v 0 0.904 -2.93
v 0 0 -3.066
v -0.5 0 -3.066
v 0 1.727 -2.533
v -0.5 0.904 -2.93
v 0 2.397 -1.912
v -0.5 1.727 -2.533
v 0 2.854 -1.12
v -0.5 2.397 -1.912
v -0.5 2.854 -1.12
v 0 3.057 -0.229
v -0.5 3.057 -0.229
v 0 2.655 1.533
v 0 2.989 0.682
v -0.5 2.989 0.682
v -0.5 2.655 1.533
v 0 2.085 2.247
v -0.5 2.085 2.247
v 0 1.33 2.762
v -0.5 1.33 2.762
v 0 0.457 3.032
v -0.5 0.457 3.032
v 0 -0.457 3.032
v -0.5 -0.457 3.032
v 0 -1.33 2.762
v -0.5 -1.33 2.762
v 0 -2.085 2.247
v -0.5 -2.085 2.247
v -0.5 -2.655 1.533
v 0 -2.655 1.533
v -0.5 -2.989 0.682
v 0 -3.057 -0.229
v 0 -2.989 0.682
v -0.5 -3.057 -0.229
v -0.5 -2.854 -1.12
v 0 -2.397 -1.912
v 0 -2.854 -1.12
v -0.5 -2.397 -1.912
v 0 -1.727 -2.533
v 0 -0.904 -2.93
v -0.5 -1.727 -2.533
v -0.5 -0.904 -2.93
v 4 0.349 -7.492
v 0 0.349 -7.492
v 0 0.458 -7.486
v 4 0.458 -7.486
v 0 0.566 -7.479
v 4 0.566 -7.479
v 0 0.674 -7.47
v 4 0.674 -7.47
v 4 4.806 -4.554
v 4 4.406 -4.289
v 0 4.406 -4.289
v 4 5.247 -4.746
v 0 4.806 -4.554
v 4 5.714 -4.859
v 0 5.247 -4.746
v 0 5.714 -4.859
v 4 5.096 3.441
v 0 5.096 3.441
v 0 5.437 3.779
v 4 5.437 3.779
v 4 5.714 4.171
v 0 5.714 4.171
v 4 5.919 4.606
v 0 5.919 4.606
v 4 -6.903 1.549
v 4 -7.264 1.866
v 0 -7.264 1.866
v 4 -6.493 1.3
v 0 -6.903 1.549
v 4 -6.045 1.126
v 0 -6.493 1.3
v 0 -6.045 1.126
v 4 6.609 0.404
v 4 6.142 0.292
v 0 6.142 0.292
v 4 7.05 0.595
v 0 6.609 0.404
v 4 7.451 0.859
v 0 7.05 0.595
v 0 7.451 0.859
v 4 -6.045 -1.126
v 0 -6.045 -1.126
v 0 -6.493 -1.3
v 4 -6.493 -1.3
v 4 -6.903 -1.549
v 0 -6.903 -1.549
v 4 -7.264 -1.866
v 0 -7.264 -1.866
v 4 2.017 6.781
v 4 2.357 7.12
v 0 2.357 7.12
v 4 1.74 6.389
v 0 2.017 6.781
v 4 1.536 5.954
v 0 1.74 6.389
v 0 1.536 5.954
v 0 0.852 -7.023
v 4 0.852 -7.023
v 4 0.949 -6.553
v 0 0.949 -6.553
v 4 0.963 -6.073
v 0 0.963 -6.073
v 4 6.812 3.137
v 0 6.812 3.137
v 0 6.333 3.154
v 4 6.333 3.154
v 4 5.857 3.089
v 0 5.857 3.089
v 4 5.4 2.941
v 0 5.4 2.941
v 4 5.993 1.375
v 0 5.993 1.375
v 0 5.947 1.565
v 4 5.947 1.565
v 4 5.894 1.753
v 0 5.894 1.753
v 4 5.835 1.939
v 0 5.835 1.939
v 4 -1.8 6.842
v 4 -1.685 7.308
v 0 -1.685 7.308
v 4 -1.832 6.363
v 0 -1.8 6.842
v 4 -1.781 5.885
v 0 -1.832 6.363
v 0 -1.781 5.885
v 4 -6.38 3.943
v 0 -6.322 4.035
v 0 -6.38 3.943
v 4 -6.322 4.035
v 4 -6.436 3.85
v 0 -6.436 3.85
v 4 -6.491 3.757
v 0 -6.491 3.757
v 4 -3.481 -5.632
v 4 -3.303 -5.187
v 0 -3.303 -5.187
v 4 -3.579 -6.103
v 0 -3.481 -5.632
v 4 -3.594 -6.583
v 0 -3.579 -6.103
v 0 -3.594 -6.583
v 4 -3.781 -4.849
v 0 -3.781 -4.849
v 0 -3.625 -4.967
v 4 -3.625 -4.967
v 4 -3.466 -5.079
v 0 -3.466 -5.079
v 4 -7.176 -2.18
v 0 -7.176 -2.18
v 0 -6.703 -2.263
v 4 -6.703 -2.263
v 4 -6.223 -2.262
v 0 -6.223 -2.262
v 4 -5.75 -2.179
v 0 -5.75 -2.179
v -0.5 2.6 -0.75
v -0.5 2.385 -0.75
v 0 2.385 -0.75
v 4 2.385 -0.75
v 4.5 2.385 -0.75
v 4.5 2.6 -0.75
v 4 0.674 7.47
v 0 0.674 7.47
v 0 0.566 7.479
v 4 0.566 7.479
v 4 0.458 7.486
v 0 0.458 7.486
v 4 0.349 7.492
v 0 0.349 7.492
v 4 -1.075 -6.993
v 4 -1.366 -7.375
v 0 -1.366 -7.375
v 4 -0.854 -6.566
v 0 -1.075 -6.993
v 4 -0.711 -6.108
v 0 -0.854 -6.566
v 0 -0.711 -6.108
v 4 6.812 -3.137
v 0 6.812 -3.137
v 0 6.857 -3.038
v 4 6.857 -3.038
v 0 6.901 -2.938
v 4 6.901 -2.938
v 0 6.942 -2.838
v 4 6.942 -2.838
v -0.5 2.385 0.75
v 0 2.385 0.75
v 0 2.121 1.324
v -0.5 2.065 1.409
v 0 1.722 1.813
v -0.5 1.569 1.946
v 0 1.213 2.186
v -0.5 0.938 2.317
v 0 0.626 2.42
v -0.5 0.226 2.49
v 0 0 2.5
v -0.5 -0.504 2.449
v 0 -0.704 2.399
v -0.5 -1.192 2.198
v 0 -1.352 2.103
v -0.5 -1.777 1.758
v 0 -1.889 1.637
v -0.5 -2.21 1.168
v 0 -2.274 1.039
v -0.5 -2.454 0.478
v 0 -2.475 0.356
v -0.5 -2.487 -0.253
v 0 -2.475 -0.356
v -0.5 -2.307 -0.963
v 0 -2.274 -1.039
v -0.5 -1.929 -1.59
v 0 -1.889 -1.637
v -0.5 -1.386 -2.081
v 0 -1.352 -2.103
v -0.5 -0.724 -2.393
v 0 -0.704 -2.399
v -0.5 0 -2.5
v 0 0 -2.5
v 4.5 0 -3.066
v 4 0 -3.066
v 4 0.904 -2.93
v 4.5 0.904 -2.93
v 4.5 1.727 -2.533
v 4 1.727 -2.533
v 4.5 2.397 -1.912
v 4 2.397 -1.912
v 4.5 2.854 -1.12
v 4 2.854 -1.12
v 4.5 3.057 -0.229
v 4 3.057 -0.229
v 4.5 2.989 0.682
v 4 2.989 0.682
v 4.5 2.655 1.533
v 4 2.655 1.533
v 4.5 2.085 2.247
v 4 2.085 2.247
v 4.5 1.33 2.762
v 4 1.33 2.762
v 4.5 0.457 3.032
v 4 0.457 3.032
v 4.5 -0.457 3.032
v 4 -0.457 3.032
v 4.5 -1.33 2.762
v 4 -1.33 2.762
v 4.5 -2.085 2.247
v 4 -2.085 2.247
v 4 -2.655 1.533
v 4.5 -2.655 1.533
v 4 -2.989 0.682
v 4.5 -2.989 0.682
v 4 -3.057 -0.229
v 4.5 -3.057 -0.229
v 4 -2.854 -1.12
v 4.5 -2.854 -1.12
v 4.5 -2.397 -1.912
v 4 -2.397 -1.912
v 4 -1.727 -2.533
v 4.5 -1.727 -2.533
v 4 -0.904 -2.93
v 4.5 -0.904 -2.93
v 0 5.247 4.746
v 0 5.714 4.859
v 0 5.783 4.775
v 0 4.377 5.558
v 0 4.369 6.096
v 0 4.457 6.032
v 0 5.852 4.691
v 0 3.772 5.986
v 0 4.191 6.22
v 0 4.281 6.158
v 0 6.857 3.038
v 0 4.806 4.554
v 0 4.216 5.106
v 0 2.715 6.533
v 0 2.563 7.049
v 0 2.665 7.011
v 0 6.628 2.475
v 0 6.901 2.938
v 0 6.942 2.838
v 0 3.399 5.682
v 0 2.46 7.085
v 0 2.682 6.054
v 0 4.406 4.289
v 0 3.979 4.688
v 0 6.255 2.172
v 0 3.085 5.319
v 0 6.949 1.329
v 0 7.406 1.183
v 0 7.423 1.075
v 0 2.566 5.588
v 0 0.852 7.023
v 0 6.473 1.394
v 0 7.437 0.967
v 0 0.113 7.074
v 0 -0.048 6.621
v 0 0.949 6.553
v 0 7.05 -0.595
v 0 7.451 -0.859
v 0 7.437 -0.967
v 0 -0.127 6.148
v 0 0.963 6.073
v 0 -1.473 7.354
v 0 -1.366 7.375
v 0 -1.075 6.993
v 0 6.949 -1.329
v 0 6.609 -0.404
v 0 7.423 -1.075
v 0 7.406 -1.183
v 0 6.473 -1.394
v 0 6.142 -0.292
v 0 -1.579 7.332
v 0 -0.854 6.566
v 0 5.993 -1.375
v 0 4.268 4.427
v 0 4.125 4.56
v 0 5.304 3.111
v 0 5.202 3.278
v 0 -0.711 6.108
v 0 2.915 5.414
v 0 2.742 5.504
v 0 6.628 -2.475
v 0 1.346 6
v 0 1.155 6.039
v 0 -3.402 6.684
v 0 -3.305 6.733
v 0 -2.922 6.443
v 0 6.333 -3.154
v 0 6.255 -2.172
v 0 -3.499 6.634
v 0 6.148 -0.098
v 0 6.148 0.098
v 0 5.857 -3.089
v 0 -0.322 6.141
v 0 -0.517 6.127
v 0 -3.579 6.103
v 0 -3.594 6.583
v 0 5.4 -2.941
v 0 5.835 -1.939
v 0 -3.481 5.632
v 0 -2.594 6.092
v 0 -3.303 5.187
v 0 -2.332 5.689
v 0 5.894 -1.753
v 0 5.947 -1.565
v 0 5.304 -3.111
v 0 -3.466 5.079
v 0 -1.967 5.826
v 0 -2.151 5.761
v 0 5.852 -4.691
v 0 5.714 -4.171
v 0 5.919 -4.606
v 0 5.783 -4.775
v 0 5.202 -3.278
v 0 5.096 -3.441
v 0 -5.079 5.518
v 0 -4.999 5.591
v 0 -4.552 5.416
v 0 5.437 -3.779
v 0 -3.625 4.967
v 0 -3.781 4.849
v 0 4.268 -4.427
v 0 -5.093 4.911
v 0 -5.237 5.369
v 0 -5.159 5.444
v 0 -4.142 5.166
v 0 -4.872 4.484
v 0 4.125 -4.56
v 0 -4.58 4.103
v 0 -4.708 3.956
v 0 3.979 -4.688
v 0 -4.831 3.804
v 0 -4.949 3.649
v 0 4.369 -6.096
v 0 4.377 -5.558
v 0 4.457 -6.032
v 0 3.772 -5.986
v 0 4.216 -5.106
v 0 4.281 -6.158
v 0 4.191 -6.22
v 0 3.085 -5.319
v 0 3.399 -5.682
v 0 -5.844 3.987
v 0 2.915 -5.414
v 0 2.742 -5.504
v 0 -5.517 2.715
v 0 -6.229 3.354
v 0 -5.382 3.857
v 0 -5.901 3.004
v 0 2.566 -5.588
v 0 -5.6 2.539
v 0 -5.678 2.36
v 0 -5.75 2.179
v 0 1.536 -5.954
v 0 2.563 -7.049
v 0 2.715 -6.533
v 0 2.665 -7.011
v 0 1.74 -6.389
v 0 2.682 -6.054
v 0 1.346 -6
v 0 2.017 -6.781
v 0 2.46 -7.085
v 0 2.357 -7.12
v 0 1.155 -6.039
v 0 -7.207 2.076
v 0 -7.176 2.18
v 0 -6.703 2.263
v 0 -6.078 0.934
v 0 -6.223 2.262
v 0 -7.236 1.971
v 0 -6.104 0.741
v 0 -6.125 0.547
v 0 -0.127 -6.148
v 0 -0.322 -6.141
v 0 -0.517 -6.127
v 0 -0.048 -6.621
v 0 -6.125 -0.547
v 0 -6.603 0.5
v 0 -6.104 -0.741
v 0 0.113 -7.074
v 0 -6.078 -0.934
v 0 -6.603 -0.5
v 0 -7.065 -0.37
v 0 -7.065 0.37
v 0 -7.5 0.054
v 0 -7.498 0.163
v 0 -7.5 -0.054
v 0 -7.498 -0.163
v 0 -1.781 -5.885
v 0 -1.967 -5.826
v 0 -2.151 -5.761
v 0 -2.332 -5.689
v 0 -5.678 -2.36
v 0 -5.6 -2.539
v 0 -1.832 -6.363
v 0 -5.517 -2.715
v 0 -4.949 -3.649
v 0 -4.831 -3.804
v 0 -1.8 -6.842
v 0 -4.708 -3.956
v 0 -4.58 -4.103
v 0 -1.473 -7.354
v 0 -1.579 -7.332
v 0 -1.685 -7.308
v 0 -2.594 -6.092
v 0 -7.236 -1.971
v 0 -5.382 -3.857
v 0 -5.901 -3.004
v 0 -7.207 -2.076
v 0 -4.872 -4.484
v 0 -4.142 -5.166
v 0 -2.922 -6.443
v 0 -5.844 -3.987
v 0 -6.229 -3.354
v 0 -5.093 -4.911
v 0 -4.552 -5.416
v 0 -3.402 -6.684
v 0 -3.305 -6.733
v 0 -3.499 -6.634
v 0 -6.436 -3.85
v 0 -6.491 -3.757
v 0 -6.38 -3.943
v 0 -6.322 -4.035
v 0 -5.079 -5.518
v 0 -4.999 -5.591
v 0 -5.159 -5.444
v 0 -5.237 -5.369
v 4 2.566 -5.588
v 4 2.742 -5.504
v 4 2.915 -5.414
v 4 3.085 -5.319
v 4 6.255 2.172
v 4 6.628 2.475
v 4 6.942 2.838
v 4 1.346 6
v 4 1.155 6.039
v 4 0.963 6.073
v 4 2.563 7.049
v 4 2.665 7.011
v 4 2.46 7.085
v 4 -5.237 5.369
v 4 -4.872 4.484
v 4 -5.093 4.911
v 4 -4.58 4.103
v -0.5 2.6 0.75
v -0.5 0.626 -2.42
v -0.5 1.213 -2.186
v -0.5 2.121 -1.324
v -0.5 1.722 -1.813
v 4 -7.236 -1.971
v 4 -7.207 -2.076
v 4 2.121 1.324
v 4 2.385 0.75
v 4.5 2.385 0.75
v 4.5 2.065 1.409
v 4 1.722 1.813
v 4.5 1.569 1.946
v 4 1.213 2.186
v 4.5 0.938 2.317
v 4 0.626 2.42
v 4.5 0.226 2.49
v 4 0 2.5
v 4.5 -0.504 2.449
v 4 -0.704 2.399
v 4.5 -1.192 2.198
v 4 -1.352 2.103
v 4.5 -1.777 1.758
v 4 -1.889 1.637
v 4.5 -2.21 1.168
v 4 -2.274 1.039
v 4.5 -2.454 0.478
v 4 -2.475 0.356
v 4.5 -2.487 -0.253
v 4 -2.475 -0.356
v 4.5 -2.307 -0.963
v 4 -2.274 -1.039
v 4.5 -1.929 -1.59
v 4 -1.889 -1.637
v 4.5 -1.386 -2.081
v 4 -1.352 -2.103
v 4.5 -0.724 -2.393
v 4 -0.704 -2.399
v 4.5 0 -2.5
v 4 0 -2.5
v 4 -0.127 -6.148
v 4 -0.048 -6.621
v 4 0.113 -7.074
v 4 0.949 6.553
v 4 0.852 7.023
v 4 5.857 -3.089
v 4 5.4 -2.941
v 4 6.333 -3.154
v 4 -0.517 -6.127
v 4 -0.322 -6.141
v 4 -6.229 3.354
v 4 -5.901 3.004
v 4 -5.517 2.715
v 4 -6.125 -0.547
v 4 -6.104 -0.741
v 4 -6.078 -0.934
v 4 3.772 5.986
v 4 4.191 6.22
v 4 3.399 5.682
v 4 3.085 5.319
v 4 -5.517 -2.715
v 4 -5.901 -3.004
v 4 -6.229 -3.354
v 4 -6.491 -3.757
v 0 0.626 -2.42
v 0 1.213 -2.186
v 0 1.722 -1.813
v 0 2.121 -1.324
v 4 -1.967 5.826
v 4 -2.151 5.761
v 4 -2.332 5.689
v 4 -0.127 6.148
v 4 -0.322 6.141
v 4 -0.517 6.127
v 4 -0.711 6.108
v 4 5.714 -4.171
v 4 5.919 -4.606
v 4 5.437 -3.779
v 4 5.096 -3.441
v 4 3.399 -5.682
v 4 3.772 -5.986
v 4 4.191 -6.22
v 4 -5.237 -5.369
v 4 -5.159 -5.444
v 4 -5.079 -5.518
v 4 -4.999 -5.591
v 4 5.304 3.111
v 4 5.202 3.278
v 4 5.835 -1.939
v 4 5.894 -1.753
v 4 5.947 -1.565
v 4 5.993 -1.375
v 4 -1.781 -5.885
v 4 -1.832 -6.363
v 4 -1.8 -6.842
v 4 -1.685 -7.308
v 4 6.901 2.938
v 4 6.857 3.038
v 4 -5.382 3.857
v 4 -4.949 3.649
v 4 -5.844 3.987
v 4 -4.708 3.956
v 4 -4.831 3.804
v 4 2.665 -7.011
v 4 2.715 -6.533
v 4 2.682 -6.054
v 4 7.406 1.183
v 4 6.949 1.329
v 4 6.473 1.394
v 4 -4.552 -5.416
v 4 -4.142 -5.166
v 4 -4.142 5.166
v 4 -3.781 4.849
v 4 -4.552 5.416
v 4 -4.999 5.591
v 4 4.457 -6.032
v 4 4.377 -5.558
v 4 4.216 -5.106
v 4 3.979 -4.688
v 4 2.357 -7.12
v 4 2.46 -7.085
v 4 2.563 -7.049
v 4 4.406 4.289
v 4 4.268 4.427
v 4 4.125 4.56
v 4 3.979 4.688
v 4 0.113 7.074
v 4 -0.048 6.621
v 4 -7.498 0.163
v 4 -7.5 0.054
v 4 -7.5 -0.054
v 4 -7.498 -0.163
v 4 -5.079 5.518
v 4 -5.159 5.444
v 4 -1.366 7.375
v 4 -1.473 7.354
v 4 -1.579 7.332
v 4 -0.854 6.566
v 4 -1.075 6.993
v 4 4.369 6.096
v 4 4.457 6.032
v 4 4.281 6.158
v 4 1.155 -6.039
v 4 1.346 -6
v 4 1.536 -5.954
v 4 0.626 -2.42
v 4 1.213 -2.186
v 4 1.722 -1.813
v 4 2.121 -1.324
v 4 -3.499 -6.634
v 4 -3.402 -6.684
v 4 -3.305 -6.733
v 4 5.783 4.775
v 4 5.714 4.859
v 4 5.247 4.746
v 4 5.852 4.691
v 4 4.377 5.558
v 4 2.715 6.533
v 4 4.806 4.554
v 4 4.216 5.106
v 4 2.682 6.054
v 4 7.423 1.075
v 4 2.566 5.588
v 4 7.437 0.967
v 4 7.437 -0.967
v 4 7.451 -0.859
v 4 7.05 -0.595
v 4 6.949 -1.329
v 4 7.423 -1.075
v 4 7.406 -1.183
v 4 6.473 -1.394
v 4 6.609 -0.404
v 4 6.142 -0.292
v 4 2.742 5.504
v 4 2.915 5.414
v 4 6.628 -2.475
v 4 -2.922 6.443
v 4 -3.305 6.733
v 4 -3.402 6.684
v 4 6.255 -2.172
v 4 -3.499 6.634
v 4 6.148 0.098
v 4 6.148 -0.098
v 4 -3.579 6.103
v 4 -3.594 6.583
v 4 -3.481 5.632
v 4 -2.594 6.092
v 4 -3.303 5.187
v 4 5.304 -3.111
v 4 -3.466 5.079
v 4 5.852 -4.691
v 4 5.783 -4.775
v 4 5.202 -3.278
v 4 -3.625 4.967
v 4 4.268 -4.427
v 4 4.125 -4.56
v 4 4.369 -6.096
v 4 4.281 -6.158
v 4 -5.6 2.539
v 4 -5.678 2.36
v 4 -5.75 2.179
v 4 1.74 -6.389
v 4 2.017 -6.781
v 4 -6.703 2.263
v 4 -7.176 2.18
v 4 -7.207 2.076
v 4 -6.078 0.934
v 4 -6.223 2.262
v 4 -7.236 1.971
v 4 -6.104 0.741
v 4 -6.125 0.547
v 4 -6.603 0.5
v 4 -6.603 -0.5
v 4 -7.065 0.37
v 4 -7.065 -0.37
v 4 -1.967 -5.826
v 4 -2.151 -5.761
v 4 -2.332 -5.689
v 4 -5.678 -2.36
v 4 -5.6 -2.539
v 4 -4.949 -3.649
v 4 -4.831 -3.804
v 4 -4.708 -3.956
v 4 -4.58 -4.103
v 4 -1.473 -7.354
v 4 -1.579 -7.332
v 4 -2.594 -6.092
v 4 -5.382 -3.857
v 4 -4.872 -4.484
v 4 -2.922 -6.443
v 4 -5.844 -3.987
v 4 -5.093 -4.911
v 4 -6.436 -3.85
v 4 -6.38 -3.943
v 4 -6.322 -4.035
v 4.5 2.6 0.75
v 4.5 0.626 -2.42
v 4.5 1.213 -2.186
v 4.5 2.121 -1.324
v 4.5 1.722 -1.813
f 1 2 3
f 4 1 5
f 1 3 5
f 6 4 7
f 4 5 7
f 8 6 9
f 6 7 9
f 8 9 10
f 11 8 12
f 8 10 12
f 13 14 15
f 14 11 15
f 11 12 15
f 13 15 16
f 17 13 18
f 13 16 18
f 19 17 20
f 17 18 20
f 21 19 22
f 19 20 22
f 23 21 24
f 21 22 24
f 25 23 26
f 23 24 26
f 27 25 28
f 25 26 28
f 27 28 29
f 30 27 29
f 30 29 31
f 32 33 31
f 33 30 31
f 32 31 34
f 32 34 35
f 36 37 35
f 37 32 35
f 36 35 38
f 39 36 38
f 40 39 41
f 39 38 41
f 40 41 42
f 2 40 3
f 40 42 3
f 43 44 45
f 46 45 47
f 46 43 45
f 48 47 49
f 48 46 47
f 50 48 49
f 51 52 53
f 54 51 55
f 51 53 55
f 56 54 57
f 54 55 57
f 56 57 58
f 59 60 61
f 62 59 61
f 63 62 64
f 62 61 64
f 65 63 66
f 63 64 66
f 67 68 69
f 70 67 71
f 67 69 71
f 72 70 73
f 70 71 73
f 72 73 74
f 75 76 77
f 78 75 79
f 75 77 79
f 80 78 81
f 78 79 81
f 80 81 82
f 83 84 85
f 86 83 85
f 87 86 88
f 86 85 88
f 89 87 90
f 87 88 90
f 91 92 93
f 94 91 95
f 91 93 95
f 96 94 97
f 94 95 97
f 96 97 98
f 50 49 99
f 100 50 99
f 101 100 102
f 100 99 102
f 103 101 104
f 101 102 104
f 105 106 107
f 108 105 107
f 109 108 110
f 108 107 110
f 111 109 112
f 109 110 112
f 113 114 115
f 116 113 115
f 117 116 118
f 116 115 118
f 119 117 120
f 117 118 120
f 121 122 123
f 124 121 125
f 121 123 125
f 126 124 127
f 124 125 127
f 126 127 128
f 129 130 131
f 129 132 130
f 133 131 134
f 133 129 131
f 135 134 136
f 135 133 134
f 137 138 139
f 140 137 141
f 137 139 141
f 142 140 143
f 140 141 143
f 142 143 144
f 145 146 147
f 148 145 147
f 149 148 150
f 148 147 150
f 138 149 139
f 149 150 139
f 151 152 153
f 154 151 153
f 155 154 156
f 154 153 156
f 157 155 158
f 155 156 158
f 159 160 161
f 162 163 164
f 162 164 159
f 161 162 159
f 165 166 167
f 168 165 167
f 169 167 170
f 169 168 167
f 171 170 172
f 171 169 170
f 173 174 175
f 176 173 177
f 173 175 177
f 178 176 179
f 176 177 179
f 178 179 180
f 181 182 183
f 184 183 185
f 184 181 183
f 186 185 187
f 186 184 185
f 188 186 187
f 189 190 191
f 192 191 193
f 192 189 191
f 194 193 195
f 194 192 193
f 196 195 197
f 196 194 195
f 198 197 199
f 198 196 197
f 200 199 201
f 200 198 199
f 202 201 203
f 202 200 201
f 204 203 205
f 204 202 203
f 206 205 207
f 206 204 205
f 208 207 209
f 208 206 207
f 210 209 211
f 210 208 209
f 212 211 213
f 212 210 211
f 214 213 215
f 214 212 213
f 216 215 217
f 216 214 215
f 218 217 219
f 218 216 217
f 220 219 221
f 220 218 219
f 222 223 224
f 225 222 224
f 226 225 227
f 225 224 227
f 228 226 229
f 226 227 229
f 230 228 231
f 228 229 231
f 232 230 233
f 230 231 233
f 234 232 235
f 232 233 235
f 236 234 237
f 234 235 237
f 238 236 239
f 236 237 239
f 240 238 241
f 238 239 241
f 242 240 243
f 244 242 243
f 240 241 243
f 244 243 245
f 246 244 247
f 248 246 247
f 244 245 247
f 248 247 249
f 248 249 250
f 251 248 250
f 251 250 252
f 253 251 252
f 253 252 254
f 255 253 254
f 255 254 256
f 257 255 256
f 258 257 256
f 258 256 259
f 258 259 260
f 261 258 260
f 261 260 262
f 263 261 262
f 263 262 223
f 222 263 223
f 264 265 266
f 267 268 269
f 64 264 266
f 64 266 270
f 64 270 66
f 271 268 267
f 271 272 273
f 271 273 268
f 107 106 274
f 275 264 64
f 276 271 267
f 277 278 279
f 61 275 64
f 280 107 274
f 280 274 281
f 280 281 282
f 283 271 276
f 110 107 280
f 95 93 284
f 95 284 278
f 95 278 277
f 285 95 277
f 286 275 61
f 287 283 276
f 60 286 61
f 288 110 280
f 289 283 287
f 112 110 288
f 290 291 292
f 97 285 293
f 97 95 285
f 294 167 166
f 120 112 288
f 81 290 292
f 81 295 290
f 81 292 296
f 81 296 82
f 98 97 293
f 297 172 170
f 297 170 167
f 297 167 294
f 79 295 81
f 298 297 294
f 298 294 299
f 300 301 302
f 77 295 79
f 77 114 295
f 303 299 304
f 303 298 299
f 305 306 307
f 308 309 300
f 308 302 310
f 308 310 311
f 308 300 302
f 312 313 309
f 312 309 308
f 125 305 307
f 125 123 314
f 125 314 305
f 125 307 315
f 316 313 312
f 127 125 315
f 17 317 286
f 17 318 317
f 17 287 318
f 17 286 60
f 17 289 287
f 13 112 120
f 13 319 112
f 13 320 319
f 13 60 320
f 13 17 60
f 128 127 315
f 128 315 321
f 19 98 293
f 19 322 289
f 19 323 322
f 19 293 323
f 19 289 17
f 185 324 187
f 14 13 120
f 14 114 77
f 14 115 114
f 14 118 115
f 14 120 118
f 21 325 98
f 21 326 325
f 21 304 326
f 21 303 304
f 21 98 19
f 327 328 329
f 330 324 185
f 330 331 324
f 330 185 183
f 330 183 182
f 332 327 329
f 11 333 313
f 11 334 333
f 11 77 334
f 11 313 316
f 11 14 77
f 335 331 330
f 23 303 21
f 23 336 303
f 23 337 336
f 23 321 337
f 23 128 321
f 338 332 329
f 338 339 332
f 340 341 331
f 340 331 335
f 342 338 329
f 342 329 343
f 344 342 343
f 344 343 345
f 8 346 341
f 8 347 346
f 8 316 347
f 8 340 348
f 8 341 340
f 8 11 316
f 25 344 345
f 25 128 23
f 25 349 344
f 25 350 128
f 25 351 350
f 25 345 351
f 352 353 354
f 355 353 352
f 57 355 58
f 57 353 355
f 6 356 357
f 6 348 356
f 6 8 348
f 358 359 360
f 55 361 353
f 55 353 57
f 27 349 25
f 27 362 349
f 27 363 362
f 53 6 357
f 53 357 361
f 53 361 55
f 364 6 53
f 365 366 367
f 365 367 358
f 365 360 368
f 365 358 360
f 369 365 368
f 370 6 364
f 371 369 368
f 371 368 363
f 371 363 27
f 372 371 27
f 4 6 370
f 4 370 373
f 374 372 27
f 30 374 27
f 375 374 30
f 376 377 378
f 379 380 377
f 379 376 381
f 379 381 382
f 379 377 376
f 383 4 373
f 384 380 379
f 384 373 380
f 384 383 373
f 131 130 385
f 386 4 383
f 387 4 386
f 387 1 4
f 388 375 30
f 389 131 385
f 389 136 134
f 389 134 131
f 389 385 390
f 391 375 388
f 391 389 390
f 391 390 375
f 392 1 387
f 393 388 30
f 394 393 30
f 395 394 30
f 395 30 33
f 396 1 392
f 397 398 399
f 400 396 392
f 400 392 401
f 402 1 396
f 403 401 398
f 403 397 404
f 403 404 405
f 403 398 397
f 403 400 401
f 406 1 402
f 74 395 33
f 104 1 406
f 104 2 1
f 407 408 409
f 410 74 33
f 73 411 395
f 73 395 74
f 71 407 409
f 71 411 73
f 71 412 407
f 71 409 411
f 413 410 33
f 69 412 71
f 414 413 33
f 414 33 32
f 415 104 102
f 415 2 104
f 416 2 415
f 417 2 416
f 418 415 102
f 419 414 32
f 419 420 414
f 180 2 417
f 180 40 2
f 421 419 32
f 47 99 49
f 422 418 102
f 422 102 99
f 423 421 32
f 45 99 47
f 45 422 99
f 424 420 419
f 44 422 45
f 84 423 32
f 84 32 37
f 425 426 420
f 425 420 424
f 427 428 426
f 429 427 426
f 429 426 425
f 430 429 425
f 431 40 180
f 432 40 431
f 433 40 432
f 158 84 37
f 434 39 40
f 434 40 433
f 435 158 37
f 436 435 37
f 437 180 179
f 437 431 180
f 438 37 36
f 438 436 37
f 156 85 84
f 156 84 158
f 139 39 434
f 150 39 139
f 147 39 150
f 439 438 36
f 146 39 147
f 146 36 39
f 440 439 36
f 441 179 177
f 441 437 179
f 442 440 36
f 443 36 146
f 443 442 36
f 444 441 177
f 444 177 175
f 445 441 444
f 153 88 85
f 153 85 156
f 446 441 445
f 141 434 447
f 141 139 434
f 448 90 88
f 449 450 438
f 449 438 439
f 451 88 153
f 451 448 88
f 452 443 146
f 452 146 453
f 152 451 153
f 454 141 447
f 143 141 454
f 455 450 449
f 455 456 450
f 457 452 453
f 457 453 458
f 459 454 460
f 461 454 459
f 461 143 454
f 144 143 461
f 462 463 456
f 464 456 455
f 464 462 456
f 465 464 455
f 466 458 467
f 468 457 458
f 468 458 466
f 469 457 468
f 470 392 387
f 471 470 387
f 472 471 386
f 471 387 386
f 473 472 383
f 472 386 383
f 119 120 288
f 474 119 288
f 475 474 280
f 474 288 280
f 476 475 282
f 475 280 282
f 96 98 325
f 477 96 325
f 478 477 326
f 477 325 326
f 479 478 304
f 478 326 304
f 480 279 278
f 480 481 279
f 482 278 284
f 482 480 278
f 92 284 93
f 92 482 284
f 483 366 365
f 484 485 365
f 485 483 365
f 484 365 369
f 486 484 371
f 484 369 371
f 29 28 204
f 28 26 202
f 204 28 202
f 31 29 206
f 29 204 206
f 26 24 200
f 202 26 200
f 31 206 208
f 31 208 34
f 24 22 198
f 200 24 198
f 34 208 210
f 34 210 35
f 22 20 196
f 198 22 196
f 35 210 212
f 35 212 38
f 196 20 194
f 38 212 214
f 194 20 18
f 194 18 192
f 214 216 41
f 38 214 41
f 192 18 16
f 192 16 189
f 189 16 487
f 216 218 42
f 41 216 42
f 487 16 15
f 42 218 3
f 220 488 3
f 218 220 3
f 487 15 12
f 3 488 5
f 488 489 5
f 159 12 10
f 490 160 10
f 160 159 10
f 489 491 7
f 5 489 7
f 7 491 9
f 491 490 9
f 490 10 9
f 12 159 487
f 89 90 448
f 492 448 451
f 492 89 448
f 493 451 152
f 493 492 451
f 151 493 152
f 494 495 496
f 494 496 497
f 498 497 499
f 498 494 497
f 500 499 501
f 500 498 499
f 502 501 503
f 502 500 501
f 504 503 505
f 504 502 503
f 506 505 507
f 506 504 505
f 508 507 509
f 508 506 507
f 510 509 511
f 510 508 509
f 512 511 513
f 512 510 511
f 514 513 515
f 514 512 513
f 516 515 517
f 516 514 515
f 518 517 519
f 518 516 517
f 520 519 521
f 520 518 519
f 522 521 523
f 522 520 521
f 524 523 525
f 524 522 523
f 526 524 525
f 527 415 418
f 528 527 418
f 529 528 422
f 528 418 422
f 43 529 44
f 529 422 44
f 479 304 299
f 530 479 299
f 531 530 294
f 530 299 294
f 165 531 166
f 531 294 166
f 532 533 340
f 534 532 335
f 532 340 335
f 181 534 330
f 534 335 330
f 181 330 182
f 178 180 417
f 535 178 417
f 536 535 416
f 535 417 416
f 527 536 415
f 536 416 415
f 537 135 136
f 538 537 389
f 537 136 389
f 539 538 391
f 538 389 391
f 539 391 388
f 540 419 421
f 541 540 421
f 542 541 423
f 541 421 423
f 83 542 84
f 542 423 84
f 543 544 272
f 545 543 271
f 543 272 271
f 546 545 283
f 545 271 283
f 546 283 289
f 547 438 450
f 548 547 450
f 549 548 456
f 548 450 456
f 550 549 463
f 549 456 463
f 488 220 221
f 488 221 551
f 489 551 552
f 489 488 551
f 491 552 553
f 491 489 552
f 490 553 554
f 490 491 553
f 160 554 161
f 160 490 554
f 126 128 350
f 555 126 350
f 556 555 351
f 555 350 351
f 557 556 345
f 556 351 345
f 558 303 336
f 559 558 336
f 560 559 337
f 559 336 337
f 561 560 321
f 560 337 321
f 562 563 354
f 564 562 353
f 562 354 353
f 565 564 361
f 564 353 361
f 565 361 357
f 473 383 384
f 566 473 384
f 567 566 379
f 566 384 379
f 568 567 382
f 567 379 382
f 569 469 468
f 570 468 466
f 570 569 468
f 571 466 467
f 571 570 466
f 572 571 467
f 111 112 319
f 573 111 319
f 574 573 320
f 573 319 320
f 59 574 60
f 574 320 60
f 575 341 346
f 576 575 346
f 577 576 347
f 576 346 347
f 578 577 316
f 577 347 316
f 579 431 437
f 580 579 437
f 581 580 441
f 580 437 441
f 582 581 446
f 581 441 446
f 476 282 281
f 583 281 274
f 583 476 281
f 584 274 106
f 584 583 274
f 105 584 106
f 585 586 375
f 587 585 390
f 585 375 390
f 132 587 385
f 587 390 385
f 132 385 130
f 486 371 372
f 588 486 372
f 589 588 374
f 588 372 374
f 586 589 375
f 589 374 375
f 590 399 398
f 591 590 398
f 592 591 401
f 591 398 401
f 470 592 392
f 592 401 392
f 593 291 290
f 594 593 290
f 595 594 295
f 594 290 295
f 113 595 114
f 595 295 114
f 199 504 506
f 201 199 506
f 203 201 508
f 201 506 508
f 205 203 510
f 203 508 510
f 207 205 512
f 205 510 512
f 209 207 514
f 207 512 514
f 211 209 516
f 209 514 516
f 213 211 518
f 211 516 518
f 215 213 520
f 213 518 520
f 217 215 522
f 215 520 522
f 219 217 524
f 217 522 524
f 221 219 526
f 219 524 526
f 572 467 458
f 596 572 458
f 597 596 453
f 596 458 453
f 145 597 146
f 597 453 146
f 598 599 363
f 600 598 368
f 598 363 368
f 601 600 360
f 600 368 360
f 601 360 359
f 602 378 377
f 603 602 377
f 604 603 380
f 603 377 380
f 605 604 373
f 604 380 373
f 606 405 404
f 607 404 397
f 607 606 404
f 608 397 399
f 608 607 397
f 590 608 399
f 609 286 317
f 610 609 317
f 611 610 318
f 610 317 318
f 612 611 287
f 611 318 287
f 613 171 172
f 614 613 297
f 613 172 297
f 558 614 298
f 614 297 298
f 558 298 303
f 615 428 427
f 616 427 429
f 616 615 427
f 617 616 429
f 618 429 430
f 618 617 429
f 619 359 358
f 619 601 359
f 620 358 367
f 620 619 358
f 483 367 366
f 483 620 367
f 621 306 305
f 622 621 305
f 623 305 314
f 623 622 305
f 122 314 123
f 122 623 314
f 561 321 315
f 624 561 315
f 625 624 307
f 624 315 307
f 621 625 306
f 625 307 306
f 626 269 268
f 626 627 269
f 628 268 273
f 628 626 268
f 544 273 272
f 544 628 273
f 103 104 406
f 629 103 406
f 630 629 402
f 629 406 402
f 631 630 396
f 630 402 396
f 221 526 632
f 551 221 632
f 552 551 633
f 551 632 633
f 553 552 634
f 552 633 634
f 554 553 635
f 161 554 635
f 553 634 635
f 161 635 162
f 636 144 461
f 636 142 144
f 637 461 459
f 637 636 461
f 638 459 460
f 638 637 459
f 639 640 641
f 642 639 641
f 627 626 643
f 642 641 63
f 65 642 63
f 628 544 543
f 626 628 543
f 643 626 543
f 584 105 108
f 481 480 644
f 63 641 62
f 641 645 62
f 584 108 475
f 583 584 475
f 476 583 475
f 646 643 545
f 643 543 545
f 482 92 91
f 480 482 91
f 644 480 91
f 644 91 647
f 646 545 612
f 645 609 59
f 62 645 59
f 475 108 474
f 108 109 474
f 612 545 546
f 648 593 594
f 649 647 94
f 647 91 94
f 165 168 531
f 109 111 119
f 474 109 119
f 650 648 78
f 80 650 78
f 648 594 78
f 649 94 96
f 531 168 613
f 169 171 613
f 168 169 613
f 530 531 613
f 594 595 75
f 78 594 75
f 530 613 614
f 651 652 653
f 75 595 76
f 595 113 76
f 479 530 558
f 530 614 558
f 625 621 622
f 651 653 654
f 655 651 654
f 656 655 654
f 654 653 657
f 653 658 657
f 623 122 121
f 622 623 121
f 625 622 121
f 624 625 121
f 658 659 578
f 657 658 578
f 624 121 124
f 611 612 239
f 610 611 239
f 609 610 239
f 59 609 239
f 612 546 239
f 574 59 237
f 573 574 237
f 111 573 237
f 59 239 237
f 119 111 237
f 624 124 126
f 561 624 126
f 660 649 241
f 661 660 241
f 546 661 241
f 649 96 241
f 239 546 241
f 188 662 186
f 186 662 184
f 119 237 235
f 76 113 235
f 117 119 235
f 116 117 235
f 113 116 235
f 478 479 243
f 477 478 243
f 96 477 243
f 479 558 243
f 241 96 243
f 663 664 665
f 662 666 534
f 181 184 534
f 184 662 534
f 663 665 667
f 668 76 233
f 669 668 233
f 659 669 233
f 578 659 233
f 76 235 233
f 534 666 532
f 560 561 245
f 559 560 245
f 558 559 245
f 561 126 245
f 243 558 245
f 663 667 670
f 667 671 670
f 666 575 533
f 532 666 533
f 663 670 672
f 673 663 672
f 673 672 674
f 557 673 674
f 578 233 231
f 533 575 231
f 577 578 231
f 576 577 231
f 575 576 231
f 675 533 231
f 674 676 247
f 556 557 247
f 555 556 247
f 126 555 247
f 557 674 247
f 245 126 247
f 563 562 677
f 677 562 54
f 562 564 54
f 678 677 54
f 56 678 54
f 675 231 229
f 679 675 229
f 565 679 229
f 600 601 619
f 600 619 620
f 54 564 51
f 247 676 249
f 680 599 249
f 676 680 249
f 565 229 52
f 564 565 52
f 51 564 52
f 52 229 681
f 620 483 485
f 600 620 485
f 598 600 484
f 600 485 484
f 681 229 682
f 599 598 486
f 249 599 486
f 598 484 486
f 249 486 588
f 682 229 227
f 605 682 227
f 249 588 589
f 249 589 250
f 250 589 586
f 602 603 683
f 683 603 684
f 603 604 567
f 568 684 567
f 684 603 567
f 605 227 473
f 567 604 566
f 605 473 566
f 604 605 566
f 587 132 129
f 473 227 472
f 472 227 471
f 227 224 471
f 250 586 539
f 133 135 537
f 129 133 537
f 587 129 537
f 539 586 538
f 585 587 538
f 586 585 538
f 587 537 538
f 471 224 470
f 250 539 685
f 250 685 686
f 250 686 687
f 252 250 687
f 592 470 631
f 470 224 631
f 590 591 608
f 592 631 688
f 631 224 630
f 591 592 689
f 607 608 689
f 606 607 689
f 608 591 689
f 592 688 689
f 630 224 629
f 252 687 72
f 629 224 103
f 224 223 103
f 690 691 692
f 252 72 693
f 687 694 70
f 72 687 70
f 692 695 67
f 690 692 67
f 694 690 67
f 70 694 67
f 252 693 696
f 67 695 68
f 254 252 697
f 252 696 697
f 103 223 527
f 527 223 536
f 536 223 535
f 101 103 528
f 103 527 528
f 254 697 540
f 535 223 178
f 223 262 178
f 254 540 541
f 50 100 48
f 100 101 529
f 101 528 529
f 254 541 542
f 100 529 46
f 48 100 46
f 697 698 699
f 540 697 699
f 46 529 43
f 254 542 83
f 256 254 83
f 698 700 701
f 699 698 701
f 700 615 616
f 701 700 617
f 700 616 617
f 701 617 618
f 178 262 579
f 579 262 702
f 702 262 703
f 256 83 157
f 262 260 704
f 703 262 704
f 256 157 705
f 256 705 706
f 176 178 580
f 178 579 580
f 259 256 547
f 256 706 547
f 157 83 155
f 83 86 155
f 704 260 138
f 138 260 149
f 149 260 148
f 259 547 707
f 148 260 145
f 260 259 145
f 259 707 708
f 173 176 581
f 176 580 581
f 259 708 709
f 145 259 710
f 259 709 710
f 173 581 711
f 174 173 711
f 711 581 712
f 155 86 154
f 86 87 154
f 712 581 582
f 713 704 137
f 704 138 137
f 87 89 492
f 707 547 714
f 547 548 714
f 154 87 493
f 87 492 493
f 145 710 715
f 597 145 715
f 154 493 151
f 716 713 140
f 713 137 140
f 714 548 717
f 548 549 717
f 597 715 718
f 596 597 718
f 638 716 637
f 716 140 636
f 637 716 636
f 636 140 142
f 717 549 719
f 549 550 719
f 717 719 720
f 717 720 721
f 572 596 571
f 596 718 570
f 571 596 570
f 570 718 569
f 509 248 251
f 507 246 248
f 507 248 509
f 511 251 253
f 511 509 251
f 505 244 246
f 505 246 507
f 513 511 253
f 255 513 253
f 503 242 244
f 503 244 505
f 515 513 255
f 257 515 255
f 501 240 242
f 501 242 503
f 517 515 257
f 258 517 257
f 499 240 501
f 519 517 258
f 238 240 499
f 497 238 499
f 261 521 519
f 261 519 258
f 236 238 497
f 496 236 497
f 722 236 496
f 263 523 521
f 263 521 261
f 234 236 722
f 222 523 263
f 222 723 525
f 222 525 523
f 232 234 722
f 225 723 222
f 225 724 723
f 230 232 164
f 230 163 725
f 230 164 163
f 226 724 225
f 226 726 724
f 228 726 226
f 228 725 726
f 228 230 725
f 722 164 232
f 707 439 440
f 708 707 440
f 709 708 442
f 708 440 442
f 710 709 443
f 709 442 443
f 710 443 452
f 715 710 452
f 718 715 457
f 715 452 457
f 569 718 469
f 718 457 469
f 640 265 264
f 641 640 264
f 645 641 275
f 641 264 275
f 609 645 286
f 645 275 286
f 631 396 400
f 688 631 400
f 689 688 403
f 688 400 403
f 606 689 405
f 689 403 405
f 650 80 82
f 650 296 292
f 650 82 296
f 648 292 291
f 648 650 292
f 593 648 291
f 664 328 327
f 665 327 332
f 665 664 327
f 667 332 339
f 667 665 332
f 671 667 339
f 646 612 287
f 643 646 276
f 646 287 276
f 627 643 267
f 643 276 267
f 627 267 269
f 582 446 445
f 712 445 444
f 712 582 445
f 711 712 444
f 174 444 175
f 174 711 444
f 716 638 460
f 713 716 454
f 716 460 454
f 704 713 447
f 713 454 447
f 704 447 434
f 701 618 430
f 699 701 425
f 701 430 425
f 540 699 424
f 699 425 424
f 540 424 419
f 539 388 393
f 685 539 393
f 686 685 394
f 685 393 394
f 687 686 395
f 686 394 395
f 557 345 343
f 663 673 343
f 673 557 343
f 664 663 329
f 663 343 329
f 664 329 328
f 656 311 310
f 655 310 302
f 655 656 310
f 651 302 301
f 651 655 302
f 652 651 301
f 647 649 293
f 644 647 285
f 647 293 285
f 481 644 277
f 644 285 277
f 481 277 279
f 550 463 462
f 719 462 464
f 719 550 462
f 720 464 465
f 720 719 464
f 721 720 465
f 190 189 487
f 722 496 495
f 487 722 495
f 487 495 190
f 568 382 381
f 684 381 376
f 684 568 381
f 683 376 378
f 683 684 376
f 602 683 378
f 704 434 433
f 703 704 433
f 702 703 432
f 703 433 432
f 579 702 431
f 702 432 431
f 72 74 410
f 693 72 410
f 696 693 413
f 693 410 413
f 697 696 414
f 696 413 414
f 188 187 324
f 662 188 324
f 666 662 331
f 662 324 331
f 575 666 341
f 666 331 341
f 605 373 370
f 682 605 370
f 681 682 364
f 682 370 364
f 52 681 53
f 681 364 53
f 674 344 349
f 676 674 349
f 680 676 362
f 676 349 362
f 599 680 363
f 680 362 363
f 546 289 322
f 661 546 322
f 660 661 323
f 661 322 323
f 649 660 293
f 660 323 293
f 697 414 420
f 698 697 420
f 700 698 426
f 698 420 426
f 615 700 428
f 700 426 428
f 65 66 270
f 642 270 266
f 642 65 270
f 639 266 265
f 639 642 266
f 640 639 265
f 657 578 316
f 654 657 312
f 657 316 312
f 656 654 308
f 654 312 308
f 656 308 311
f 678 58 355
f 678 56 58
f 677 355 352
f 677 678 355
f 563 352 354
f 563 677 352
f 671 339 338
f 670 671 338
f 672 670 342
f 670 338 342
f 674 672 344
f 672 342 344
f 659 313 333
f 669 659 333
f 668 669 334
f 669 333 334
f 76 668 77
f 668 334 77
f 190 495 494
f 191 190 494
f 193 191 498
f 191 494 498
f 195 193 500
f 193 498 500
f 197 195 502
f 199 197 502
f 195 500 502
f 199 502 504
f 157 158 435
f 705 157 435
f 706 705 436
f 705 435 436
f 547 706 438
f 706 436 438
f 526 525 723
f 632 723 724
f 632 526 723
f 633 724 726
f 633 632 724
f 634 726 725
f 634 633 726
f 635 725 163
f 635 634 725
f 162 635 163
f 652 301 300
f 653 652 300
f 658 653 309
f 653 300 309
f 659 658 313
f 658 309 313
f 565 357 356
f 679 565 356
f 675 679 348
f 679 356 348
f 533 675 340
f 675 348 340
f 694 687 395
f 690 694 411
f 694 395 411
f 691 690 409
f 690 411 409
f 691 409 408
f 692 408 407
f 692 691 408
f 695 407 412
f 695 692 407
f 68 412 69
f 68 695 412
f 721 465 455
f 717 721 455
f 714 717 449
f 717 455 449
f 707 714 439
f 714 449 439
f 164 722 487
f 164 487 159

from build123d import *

# Parameters (mm, degrees)
BASPROSKE_W         = 4
BASPROSKE_H         = 7.5
TOOTHCUT_DEPTH      = 12.335784049
TEETHCUTS_COUNT     = 23
TEETHCUTS_ANGLE     = 344.347826087
BORSKE_R            = 2.5
BORE_DEPTH          = 50.0000508
EXTRUDE1_DEPTH      = 0.5
EXTRUDE1_DEPTH_BACK = 4.5
SKETCH1_R           = 3.065937152
SKETCH1_R_2         = 2.5
SKETCH2_W           = 1.5
SKETCH2_H           = 2.6
CUT_EXTRUDE1_DEPTH  = 5.5


with BuildPart() as part:
    # BasProSke → Base-Revolve (revolve)
    with BuildSketch(Plane(origin=(0, 0, 0), x_dir=(1, 0, 0), z_dir=(0, 1, 0))):
        with Locations((2, 3.75)):
            Rectangle(BASPROSKE_W, BASPROSKE_H)
    revolve(axis=Axis((-10, 0, 0), (1, 0, 0)))

    # TooCutSke → ToothCut (cut, through all)
    with BuildSketch(Plane(origin=(0, 0, 0), x_dir=(0, 0, -1), z_dir=(1, 0, 0))):
        with BuildLine():
            ThreePointArc((0.292498096, 6.142039227), (0, 6.149), (-0.292498096, 6.142039227))
            ThreePointArc((-0.292498096, 6.142039227), (-0.495998432, 6.847302274), (-0.878204189, 7.473981707))
            ThreePointArc((-0.878204189, 7.473981707), (0, 7.5254), (0.878204189, 7.473981707))
            ThreePointArc((0.878204189, 7.473981707), (0.495998432, 6.847302274), (0.292498096, 6.142039227))
        make_face()
    toothcut = extrude(amount=TOOTHCUT_DEPTH, mode=Mode.SUBTRACT)

    # TeethCuts: ToothCut ×23 about axis
    teethcuts_axis = Axis((-10, 0, 0), (1, 0, 0))
    for i in range(1, TEETHCUTS_COUNT):
        add(toothcut.rotate(teethcuts_axis, i * TEETHCUTS_ANGLE / (TEETHCUTS_COUNT - 1)), mode=Mode.SUBTRACT)

    # BorSke → Bore (cut, symmetric)
    with BuildSketch(Plane(origin=(0, 0, 0), x_dir=(0, 0, -1), z_dir=(1, 0, 0))):
        Circle(BORSKE_R)
    extrude(amount=BORE_DEPTH, both=True, mode=Mode.SUBTRACT)

    # Sketch1 → Extrude1 (add, two sides: drawn at the far end of the back side and taken through both)
    with BuildSketch(Plane(origin=(4, 0, 0), x_dir=(0, 0, -1), z_dir=(1, 0, 0)).offset(-EXTRUDE1_DEPTH_BACK)):
        Circle(SKETCH1_R)
        Circle(SKETCH1_R_2, mode=Mode.SUBTRACT)
    extrude(amount=EXTRUDE1_DEPTH + EXTRUDE1_DEPTH_BACK)

    # Sketch2 → Cut-Extrude1 (cut)
    with BuildSketch(Plane(origin=(4.5, 0, 0), x_dir=(0, 0, -1), z_dir=(1, 0, 0))):
        with Locations((0, 1.3)):
            Rectangle(SKETCH2_W, SKETCH2_H)
    extrude(amount=-CUT_EXTRUDE1_DEPTH, mode=Mode.SUBTRACT)


solid = part.part
